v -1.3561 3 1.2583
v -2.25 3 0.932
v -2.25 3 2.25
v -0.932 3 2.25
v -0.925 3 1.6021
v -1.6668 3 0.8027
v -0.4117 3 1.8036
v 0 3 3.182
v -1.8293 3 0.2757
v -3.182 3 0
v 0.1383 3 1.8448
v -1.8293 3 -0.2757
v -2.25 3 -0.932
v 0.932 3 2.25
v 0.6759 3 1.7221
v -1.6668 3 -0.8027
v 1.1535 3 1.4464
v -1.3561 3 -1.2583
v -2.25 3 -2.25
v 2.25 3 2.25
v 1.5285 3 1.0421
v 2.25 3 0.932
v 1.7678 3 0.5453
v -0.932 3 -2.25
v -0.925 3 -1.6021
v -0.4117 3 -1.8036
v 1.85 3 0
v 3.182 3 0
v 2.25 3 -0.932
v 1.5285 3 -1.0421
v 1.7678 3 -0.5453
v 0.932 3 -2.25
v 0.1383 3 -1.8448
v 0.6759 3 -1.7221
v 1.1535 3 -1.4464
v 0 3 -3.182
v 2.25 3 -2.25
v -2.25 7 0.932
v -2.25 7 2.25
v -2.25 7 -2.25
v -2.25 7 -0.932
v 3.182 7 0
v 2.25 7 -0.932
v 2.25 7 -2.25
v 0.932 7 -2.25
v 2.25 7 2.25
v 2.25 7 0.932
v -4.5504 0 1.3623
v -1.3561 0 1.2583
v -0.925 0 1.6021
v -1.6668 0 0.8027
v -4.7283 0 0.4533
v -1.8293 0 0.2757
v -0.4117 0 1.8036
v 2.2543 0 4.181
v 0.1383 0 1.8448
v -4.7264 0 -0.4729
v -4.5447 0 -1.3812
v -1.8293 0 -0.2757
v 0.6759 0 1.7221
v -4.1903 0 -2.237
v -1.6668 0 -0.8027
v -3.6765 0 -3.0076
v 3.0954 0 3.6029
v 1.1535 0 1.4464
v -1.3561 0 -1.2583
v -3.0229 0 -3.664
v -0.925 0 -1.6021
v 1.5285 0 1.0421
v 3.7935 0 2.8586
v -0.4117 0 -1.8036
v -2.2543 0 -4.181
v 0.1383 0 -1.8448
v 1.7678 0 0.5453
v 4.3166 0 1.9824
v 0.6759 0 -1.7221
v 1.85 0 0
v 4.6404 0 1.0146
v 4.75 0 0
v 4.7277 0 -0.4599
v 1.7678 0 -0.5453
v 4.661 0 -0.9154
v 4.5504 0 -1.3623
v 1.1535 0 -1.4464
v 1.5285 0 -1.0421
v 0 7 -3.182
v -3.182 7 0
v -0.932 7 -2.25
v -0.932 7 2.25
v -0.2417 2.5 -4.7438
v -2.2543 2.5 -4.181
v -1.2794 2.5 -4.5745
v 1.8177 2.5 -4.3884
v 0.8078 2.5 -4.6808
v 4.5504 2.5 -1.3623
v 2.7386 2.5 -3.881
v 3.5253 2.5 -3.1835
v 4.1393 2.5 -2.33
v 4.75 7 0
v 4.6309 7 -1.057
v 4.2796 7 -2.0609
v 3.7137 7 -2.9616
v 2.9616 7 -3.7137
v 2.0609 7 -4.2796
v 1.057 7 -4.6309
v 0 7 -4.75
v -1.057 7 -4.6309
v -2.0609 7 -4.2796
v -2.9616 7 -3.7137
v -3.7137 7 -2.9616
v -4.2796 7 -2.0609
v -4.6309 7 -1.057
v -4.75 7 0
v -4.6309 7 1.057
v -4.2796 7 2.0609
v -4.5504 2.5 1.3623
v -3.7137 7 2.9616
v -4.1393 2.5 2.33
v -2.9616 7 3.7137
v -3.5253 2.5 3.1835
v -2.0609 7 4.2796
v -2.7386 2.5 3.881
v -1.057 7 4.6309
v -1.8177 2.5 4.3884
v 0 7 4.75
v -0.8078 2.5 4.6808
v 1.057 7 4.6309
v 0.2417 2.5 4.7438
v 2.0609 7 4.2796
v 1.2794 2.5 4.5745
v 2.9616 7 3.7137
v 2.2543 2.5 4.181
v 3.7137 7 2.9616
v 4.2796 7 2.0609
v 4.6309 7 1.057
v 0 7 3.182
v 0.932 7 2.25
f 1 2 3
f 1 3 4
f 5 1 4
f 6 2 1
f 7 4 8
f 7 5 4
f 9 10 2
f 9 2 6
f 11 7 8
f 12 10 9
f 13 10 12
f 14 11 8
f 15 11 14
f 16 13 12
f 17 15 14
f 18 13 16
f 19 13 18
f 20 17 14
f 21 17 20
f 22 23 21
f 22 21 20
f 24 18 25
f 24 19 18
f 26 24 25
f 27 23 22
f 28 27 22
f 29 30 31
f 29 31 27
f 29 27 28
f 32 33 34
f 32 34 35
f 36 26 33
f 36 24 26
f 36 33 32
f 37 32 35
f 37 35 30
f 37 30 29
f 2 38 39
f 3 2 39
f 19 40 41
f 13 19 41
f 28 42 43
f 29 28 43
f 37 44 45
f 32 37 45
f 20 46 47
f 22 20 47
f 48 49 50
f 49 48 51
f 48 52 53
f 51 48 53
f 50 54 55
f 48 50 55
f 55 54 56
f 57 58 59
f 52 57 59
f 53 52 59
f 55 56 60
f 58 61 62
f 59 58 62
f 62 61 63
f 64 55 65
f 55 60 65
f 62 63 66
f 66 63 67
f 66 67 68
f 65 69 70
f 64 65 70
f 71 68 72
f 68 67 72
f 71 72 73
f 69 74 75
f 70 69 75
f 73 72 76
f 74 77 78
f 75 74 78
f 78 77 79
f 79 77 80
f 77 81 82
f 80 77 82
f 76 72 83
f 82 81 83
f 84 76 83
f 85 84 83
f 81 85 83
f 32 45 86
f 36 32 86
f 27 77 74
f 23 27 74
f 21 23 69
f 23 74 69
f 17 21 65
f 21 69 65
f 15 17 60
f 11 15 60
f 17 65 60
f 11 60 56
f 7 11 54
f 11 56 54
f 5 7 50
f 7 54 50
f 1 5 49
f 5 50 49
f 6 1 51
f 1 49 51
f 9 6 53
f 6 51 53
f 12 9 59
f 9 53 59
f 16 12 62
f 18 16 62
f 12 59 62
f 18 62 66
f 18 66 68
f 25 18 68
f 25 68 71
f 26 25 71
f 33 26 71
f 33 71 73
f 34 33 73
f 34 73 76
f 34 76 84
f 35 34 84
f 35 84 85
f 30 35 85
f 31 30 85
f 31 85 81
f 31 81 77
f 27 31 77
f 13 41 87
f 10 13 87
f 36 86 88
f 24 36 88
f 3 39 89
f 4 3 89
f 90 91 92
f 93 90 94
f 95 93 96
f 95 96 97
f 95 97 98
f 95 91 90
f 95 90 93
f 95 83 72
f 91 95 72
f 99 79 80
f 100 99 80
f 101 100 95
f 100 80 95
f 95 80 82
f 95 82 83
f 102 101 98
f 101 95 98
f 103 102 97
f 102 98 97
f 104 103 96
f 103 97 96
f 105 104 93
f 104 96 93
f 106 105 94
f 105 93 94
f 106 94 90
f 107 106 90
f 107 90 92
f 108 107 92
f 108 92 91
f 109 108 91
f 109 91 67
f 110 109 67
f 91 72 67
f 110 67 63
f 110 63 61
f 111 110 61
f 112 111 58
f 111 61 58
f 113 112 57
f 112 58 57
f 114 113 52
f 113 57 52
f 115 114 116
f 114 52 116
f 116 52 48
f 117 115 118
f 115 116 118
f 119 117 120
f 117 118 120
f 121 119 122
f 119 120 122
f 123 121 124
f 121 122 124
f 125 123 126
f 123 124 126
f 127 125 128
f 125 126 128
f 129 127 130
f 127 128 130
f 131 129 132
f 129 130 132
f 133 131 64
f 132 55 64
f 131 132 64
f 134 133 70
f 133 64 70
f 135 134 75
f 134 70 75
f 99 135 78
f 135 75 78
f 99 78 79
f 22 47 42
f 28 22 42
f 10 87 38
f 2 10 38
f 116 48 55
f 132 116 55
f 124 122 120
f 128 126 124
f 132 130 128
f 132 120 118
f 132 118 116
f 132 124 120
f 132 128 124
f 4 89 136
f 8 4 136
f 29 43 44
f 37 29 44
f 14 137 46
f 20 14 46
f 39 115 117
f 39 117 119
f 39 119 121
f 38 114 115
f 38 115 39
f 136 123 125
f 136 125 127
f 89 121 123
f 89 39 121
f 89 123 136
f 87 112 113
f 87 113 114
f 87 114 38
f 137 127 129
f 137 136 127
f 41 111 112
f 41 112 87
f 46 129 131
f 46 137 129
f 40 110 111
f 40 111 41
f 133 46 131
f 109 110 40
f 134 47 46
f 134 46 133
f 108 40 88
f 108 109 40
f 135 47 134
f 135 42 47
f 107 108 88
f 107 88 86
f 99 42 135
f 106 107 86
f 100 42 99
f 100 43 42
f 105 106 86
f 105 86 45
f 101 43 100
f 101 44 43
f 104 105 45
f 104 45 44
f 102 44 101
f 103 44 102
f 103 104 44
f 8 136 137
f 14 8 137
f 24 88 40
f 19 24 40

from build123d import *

# Parameters (mm, degrees)
SKETCH_1_R          = 4.75
EXTRUDE_1_DEPTH     = 7
CUT_EXTRUDE_1_DEPTH = 4
SKETCH_3_R          = 1.85
CUT_EXTRUDE_2_DEPTH = 8
CUT_EXTRUDE_7_DEPTH = 2.5


with BuildPart() as part:
    # Эскиз1 → Бобышка-Вытянуть1 (new body)
    with BuildSketch(Plane(origin=(0, 0, 0), x_dir=(1, 0, 0), z_dir=(0, 1, 0))):
        Circle(SKETCH_1_R)
    extrude(amount=EXTRUDE_1_DEPTH)

    # Эскиз2 → Вырез-Вытянуть1 (cut)
    with BuildSketch(Plane(origin=(0, 7, 0), x_dir=(1, 0, 0), z_dir=(0, 1, 0))):
        Polygon((-3.181980515, 0), (-2.25, -0.931980515), (-2.25, -2.25), (-0.931980515, -2.25), (0, -3.181980515), (0.931980515, -2.25), (2.25, -2.25), (2.25, -0.931980515), (3.181980515, 0), (2.25, 0.931980515), (2.25, 2.25), (0.931980515, 2.25), (0, 3.181980515), (-0.931980515, 2.25), (-2.25, 2.25), (-2.25, 0.931980515), align=None)
    extrude(amount=-CUT_EXTRUDE_1_DEPTH, mode=Mode.SUBTRACT)

    # Эскиз3 → Вырез-Вытянуть2 (cut, through all)
    with BuildSketch(Plane.XZ):
        Circle(SKETCH_3_R)
    extrude(amount=-CUT_EXTRUDE_2_DEPTH, mode=Mode.SUBTRACT)

    # Эскиз4<3> → Вырез-Вытянуть7 (cut)
    with BuildSketch(Plane.XZ):
        with BuildLine():
            ThreePointArc((2.254348542, 4.180958341), (-1.817746304, 4.388427779), (-4.550449136, 1.362318854))
            Line((-4.550449136, 1.362318854), (2.254348542, 4.180958341))
        make_face()
        with BuildLine():
            Line((4.550449136, -1.362318854), (-2.254348542, -4.180958341))
            ThreePointArc((-2.254348542, -4.180958341), (1.817746304, -4.388427779), (4.550449136, -1.362318854))
        make_face()
    extrude(amount=-CUT_EXTRUDE_7_DEPTH, mode=Mode.SUBTRACT)


solid = part.part
